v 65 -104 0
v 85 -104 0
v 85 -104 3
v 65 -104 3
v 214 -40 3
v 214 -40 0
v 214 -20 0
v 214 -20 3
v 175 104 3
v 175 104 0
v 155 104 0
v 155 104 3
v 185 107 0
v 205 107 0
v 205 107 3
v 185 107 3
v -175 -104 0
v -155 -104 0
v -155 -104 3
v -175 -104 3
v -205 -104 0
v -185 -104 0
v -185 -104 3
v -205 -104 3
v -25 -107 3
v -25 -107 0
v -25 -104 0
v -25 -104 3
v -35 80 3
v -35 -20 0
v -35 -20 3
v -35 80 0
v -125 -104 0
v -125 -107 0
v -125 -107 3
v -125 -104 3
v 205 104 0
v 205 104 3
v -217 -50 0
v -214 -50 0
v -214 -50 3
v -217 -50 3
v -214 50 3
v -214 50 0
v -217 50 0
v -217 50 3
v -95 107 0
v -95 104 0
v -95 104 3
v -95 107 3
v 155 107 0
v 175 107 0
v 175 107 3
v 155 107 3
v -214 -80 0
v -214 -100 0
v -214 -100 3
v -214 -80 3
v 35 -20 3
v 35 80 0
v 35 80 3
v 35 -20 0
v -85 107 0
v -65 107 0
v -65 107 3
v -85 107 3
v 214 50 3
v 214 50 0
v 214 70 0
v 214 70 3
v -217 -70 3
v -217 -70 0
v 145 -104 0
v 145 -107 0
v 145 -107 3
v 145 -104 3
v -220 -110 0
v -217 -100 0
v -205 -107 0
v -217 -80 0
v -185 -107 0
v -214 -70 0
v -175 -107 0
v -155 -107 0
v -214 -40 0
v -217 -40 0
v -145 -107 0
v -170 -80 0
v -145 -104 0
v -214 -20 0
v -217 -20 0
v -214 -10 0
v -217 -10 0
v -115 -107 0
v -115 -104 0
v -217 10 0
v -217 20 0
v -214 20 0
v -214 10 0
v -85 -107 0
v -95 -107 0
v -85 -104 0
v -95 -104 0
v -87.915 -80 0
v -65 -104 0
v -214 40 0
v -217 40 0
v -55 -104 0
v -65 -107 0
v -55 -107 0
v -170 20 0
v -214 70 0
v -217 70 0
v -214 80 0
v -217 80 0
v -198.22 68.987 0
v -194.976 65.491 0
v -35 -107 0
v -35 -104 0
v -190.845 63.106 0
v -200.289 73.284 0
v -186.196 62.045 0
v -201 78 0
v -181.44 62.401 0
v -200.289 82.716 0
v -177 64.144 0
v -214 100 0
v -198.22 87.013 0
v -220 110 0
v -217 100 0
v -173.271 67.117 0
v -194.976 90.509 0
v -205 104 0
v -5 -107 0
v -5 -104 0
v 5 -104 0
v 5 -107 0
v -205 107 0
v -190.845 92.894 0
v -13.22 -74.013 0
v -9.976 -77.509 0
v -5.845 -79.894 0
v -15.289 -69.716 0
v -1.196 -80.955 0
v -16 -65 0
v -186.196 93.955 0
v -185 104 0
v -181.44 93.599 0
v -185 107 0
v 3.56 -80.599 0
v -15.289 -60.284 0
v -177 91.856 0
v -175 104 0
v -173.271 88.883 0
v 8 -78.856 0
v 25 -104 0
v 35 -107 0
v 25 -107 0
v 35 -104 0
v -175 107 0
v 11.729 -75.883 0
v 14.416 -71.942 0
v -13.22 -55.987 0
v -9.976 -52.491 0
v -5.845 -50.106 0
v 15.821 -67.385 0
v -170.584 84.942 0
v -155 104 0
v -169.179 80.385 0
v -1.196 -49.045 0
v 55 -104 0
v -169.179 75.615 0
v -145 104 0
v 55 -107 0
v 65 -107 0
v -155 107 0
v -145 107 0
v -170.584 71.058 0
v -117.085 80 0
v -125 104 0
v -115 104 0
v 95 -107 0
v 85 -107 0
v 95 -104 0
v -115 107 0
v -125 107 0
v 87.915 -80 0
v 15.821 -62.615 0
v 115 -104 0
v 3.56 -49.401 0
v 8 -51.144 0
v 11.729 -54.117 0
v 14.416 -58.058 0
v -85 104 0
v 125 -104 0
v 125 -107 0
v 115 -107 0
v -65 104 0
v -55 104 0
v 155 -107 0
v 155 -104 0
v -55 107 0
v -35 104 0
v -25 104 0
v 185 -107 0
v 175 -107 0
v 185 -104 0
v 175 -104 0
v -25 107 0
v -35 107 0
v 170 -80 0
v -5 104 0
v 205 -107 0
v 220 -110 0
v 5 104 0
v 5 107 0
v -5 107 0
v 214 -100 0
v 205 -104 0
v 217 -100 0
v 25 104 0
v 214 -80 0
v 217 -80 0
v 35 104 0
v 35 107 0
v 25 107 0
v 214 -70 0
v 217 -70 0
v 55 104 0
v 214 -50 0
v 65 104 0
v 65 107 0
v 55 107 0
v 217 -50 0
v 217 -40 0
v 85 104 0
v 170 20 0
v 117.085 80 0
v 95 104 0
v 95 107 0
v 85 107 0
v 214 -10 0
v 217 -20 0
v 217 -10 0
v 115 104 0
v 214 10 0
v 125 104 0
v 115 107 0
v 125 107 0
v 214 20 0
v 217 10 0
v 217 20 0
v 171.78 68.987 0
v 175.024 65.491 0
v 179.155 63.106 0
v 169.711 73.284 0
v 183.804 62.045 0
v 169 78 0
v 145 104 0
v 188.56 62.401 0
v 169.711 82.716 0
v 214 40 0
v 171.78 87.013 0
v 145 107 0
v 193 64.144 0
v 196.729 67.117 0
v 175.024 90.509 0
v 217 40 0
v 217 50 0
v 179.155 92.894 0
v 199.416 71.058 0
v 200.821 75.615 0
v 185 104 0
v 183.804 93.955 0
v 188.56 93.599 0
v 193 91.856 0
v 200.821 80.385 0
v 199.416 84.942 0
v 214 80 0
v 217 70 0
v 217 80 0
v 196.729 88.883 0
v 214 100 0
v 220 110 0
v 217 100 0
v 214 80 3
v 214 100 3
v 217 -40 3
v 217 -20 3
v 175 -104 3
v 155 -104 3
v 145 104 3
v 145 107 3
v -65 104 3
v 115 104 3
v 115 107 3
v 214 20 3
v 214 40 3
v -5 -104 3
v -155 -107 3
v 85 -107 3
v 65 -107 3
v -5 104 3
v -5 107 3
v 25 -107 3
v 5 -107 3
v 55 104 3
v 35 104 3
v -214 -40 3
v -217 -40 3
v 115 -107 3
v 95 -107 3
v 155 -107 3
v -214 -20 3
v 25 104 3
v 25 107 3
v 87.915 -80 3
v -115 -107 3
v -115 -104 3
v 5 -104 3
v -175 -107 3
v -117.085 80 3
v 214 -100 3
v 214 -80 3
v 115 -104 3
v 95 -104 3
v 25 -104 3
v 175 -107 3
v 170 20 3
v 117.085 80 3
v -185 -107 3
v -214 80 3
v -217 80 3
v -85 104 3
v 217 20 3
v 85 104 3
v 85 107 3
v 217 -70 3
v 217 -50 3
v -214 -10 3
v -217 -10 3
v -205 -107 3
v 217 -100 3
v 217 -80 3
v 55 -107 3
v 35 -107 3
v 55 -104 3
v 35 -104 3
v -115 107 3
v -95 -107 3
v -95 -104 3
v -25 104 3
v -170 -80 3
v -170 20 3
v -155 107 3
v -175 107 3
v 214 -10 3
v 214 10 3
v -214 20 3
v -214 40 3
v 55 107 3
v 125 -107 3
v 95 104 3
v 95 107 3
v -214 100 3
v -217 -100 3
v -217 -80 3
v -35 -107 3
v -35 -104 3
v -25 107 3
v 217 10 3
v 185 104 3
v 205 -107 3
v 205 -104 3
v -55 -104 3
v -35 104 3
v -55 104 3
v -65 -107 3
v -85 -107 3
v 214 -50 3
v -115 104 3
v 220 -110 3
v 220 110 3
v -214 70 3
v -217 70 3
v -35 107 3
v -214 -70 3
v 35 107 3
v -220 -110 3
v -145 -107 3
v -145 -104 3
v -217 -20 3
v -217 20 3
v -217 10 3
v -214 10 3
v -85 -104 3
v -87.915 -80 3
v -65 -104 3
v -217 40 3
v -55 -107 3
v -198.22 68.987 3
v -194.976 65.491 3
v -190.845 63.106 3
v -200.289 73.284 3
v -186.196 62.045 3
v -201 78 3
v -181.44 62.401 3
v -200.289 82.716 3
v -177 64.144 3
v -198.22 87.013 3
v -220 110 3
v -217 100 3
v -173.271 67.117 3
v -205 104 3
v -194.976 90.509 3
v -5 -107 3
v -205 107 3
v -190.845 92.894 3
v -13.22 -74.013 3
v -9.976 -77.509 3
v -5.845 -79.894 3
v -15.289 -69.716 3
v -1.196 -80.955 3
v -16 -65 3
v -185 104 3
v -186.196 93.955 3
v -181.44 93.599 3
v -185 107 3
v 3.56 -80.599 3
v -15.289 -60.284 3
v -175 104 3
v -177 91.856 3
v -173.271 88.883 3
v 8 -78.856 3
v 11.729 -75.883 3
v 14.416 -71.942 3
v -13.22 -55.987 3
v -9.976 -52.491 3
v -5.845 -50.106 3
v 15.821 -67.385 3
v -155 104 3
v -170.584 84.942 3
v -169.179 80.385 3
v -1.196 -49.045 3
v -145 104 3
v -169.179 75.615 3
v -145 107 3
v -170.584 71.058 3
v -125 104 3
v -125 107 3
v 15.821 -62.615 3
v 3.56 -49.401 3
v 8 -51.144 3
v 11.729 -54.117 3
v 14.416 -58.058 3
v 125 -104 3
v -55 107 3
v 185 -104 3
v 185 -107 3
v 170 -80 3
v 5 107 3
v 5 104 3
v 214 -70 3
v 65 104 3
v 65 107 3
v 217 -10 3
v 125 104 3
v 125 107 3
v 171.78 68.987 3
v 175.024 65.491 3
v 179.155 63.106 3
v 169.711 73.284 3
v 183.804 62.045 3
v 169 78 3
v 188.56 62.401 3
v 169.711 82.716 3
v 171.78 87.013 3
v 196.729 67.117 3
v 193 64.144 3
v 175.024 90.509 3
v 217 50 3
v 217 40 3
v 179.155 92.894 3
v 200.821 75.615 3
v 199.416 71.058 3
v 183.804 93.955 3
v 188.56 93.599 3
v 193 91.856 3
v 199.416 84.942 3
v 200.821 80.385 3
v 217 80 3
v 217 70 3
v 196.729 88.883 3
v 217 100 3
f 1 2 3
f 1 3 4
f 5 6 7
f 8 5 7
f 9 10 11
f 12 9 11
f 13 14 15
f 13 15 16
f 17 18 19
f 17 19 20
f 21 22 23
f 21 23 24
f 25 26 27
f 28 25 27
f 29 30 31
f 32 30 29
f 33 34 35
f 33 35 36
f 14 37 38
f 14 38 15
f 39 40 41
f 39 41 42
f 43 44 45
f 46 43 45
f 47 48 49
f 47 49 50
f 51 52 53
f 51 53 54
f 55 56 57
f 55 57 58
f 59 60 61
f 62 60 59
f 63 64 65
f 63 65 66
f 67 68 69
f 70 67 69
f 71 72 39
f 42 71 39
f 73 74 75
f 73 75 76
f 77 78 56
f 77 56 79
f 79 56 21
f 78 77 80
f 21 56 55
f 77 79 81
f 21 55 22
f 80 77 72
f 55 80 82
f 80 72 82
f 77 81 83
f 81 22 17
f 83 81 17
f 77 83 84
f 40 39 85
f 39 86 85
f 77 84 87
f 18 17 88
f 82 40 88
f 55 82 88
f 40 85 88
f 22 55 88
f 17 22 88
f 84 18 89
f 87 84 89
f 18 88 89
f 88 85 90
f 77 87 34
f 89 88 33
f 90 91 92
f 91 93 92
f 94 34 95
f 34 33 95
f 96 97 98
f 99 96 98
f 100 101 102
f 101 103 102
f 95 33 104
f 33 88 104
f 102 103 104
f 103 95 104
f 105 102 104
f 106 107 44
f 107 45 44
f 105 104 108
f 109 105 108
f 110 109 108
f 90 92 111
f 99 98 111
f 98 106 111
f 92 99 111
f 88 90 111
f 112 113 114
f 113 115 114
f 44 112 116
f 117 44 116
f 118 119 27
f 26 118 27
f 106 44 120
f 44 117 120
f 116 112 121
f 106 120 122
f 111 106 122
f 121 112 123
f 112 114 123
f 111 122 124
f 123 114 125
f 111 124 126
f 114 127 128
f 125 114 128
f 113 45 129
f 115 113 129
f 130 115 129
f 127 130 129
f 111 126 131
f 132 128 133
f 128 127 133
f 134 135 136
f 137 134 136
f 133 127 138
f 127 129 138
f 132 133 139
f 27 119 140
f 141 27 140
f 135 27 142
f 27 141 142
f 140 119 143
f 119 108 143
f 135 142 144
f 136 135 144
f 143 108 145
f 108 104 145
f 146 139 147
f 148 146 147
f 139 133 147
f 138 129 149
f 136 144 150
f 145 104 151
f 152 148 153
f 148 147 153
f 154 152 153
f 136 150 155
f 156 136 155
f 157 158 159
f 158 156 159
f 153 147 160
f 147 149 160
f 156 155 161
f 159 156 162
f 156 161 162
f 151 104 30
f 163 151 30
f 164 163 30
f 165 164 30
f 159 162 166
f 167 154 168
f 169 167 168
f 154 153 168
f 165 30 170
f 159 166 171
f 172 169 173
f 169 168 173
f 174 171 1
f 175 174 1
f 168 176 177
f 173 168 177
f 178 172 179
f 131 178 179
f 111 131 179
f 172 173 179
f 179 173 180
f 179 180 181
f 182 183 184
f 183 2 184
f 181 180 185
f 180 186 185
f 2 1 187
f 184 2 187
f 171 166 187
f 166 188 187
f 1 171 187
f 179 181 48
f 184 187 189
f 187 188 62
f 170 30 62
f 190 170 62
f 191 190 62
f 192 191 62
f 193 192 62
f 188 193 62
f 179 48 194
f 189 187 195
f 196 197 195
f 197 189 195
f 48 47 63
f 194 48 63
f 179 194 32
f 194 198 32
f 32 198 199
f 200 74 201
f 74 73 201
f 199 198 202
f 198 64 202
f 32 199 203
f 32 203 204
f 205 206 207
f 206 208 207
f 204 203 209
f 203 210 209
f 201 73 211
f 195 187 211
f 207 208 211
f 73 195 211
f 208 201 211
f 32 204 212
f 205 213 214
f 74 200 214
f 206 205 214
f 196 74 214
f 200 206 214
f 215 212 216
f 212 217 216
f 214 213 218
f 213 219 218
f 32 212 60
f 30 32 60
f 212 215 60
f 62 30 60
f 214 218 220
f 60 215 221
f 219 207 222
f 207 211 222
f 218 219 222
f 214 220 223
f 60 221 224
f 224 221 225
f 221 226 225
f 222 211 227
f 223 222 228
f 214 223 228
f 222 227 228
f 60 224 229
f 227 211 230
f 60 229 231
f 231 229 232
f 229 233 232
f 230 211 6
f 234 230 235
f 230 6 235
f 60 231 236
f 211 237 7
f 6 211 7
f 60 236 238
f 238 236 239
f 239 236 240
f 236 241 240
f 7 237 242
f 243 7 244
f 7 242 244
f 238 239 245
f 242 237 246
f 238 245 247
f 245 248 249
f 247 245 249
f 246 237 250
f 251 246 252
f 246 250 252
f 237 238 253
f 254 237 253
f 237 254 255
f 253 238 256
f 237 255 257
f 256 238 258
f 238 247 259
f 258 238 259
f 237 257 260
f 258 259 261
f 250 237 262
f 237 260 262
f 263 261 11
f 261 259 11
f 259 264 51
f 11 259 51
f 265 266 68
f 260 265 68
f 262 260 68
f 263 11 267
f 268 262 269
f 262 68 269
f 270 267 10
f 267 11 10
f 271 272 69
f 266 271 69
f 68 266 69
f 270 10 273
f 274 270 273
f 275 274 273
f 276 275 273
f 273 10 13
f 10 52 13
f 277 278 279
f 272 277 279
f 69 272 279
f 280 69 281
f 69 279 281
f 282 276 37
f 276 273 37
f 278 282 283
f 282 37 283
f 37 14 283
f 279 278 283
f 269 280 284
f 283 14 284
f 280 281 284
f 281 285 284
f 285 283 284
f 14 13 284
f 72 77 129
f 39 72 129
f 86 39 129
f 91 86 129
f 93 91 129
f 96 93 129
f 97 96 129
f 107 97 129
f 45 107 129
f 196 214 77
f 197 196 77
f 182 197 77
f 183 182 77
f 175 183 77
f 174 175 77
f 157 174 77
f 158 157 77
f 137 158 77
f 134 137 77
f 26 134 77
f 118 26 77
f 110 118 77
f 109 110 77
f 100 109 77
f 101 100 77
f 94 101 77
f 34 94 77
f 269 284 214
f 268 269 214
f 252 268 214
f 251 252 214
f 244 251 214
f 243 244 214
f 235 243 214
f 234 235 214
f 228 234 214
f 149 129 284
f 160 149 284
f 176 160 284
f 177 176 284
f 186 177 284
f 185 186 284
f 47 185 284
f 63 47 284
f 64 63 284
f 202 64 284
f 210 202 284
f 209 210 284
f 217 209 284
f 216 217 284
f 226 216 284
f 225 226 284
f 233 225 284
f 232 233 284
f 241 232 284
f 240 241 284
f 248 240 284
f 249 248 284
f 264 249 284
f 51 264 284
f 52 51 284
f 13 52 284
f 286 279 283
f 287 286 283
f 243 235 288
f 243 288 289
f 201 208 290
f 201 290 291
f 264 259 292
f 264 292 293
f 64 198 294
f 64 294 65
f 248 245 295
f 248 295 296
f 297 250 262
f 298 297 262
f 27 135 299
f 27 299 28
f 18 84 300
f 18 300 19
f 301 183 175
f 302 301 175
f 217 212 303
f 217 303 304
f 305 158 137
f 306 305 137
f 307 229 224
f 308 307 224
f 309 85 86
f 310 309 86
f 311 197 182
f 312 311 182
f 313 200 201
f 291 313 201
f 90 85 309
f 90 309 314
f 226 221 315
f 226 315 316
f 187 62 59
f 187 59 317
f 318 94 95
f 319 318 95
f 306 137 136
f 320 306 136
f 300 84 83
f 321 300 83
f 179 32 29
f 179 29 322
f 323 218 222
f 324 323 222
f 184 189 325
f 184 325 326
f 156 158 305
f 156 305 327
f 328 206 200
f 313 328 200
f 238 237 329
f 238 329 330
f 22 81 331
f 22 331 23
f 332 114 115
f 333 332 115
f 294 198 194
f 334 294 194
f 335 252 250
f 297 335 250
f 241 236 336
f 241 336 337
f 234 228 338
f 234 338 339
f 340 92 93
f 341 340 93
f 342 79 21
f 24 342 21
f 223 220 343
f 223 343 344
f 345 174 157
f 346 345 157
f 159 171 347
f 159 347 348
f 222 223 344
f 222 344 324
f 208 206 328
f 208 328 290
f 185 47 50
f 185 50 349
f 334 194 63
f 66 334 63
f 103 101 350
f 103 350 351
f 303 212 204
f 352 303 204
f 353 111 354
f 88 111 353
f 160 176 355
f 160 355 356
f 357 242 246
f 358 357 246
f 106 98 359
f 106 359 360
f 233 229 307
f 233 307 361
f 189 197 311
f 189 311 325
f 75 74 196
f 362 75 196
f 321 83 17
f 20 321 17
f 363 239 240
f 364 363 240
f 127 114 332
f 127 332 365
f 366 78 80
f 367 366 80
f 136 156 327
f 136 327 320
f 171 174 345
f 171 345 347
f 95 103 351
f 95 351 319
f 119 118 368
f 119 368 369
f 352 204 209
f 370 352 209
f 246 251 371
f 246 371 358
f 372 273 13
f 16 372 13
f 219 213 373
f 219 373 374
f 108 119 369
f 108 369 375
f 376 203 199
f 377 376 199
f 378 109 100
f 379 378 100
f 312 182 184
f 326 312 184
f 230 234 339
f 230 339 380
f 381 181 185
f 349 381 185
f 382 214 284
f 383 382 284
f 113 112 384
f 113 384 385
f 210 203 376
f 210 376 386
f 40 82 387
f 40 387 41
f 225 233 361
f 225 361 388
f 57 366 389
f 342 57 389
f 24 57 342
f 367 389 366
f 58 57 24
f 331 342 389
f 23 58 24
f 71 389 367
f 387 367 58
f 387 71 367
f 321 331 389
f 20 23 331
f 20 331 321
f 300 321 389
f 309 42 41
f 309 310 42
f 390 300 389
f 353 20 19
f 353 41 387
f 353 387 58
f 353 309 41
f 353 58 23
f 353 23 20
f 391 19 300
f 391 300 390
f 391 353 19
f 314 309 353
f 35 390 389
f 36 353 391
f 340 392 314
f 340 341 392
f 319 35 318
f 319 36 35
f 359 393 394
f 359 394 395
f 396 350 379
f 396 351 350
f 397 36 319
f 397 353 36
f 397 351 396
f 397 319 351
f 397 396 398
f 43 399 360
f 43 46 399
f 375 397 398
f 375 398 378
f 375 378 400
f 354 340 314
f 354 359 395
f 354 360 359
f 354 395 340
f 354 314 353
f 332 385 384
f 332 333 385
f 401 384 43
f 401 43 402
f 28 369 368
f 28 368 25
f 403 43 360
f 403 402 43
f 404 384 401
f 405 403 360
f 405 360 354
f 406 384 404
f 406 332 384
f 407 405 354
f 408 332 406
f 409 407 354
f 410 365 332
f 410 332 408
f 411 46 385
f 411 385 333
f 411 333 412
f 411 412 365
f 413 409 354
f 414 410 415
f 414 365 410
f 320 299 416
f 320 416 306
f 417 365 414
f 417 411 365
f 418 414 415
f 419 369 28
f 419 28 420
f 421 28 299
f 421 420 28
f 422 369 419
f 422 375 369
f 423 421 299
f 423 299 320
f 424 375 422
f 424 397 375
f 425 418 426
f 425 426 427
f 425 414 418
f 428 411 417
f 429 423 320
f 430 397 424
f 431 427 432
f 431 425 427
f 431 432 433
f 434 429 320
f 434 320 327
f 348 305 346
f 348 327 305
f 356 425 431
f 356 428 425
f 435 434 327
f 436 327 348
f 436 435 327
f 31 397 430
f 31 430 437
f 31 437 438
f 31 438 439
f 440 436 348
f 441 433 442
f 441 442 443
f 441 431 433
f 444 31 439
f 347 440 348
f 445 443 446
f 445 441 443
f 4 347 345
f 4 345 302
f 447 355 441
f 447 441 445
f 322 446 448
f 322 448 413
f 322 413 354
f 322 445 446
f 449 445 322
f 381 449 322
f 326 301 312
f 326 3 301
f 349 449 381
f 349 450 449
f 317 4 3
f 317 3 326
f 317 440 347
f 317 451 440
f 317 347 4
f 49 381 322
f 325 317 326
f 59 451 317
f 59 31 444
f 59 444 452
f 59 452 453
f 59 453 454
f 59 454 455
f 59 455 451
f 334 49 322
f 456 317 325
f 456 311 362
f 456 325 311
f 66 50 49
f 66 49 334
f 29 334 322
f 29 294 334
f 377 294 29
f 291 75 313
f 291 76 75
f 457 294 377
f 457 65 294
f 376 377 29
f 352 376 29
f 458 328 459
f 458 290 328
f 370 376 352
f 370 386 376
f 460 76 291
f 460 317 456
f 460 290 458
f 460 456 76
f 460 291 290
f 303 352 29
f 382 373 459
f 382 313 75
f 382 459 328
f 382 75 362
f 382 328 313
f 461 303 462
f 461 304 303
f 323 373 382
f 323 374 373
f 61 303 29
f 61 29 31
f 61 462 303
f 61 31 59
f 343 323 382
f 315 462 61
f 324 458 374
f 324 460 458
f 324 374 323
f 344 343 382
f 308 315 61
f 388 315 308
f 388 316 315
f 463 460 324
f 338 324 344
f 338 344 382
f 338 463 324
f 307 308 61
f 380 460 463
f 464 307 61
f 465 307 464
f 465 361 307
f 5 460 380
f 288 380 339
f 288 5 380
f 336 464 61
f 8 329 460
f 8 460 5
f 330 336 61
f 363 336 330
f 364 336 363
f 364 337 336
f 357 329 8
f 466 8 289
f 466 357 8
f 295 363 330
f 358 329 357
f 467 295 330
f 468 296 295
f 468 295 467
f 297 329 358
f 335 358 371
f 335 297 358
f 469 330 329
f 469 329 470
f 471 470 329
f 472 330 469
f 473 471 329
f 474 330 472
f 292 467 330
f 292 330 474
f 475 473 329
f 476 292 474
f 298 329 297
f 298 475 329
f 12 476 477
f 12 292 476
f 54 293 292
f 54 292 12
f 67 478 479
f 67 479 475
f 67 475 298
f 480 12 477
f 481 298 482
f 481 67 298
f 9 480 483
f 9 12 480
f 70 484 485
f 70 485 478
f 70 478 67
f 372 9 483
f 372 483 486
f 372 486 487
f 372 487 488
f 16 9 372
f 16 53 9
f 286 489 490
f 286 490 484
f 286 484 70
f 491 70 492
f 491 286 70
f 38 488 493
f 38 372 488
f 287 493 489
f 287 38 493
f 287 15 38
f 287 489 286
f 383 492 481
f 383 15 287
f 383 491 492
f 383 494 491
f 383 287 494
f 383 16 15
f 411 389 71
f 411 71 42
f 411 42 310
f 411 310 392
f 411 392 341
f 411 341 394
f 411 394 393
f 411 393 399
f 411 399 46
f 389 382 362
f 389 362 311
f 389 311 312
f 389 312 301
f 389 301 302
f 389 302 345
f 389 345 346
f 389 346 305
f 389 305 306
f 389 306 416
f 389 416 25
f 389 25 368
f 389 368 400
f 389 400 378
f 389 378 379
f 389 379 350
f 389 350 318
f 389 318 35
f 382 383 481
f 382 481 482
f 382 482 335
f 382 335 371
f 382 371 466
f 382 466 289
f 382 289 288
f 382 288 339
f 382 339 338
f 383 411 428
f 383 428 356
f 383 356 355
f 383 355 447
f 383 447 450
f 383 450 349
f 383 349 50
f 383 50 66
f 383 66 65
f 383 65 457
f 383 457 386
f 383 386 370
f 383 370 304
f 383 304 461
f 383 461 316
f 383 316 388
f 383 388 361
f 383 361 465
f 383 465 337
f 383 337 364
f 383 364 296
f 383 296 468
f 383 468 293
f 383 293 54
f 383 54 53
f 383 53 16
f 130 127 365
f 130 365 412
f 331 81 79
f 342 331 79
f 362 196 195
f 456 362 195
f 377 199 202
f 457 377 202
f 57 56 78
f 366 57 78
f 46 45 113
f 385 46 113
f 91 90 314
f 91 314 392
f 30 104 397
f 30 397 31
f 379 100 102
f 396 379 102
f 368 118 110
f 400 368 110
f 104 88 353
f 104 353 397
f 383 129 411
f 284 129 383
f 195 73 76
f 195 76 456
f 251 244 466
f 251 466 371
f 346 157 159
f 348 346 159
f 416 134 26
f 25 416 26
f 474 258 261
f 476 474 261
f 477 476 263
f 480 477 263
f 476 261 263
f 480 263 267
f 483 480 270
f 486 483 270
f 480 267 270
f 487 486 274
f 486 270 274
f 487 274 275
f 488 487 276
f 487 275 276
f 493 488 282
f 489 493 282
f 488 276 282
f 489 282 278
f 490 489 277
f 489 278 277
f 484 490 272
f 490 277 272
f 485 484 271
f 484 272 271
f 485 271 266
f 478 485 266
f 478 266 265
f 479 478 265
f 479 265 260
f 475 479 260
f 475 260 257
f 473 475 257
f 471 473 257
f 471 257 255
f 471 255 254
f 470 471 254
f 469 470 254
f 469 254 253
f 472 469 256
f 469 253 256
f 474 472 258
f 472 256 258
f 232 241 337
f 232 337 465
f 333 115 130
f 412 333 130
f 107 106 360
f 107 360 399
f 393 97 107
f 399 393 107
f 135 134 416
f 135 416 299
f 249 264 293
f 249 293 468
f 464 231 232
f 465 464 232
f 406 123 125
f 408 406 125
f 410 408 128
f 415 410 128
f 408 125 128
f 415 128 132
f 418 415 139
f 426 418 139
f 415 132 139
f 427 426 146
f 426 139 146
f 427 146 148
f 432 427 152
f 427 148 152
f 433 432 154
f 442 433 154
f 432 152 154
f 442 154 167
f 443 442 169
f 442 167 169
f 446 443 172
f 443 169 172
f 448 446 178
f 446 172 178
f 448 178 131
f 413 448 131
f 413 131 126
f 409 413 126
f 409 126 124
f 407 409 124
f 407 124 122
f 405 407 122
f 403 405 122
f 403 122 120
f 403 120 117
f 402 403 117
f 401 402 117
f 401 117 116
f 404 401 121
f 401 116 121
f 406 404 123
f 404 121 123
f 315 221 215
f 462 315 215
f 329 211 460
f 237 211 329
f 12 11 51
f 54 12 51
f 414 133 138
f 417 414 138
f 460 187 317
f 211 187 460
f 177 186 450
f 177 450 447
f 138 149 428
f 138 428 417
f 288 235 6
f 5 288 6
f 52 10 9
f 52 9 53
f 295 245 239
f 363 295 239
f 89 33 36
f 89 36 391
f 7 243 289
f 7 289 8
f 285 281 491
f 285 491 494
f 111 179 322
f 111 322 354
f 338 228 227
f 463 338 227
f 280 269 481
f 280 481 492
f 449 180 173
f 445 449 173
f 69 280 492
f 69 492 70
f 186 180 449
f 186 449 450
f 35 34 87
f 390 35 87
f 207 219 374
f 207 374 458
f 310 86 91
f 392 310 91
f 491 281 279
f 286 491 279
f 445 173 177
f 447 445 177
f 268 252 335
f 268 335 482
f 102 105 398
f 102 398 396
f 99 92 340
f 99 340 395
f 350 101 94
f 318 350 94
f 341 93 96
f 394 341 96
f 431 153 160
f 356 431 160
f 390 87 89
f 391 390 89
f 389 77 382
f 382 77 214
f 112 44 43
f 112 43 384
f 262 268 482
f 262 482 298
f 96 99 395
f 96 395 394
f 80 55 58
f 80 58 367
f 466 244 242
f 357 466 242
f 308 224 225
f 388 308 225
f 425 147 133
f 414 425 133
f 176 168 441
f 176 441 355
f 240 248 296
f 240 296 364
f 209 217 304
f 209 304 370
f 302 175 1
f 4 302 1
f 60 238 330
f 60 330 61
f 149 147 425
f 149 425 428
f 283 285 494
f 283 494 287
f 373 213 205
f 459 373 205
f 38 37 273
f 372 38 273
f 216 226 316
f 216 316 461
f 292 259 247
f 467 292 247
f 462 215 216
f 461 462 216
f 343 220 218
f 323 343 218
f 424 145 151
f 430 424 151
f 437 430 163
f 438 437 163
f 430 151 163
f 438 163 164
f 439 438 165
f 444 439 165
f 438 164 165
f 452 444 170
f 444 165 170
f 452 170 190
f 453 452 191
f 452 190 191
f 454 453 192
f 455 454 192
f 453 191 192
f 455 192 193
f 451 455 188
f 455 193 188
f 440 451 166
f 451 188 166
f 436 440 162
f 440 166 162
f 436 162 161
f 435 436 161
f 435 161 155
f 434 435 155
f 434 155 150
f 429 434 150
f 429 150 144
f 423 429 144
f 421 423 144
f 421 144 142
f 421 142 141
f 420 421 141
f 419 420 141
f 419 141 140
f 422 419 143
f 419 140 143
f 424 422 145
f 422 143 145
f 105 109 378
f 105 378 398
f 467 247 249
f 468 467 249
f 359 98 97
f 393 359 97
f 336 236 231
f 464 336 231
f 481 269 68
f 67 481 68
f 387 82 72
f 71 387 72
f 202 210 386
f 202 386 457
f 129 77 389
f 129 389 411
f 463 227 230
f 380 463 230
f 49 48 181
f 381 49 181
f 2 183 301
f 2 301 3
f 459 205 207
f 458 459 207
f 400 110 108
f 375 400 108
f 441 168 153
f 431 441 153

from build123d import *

# Parameters (mm, degrees)
ESQUISSE1_W                      = 440
ESQUISSE1_H                      = 220
BOSS_EXTRU_1_DEPTH               = 3
ESQUISSE2_R                      = 16
ENL_V_MAT_TUBE_DEPTH             = 3
ESQUISSE4_W                      = 20
ESQUISSE4_H                      = 3
ENL_V_MAT_C_T_ARRI_REBOITE_DEPTH = 3
ESQUISSE5_W                      = 3
ESQUISSE5_H                      = 20
ENL_V_MAT_C_T_DGBOITE_DEPTH      = 3
ENL_V_MAT_EXTRU_1_DEPTH          = 3


with BuildPart() as part:
    # Esquisse1 → Boss.-Extru.1 (new body)
    with BuildSketch(Plane.XY):
        Rectangle(ESQUISSE1_W, ESQUISSE1_H)
    extrude(amount=BOSS_EXTRU_1_DEPTH)

    # Esquisse2 → Enlèv. mat._Tube (cut)
    with BuildSketch(Plane(origin=(0, 0, 0), x_dir=(-1, 0, 0), z_dir=(0, 0, -1))):
        with Locations((-185, 78)):
            Circle(ESQUISSE2_R)
        with Locations((185, 78)):
            Circle(ESQUISSE2_R)
        with Locations((0, -65)):
            Circle(ESQUISSE2_R)
    extrude(amount=-ENL_V_MAT_TUBE_DEPTH, mode=Mode.SUBTRACT)

    # Esquisse4 → Enlèv. mat._CôtéArrièreBoite (cut)
    with BuildSketch(Plane(origin=(0, 0, 0), x_dir=(-1, 0, 0), z_dir=(0, 0, -1))):
        with Locations((-195, 105.5)):
            Rectangle(ESQUISSE4_W, ESQUISSE4_H)
        with Locations((-165, 105.5)):
            Rectangle(ESQUISSE4_W, ESQUISSE4_H)
        with Locations((-135, 105.5)):
            Rectangle(ESQUISSE4_W, ESQUISSE4_H)
        with Locations((-105, 105.5)):
            Rectangle(ESQUISSE4_W, ESQUISSE4_H)
        with Locations((-75, 105.5)):
            Rectangle(ESQUISSE4_W, ESQUISSE4_H)
        with Locations((-45, 105.5)):
            Rectangle(ESQUISSE4_W, ESQUISSE4_H)
        with Locations((-15, 105.5)):
            Rectangle(ESQUISSE4_W, ESQUISSE4_H)
        with Locations((15, 105.5)):
            Rectangle(ESQUISSE4_W, ESQUISSE4_H)
        with Locations((45, 105.5)):
            Rectangle(ESQUISSE4_W, ESQUISSE4_H)
        with Locations((75, 105.5)):
            Rectangle(ESQUISSE4_W, ESQUISSE4_H)
        with Locations((105, 105.5)):
            Rectangle(ESQUISSE4_W, ESQUISSE4_H)
        with Locations((135, 105.5)):
            Rectangle(ESQUISSE4_W, ESQUISSE4_H)
        with Locations((165, 105.5)):
            Rectangle(ESQUISSE4_W, ESQUISSE4_H)
        with Locations((195, 105.5)):
            Rectangle(ESQUISSE4_W, ESQUISSE4_H)
        with Locations((105, -105.5)):
            Rectangle(ESQUISSE4_W, ESQUISSE4_H)
        with Locations((135, -105.5)):
            Rectangle(ESQUISSE4_W, ESQUISSE4_H)
        with Locations((165, -105.5)):
            Rectangle(ESQUISSE4_W, ESQUISSE4_H)
        with Locations((195, -105.5)):
            Rectangle(ESQUISSE4_W, ESQUISSE4_H)
        with Locations((75, -105.5)):
            Rectangle(ESQUISSE4_W, ESQUISSE4_H)
        with Locations((45, -105.5)):
            Rectangle(ESQUISSE4_W, ESQUISSE4_H)
        with Locations((15, -105.5)):
            Rectangle(ESQUISSE4_W, ESQUISSE4_H)
        with Locations((-15, -105.5)):
            Rectangle(ESQUISSE4_W, ESQUISSE4_H)
        with Locations((-45, -105.5)):
            Rectangle(ESQUISSE4_W, ESQUISSE4_H)
        with Locations((-75, -105.5)):
            Rectangle(ESQUISSE4_W, ESQUISSE4_H)
        with Locations((-105, -105.5)):
            Rectangle(ESQUISSE4_W, ESQUISSE4_H)
        with Locations((-135, -105.5)):
            Rectangle(ESQUISSE4_W, ESQUISSE4_H)
        with Locations((-165, -105.5)):
            Rectangle(ESQUISSE4_W, ESQUISSE4_H)
        with Locations((-195, -105.5)):
            Rectangle(ESQUISSE4_W, ESQUISSE4_H)
    extrude(amount=-ENL_V_MAT_C_T_ARRI_REBOITE_DEPTH, mode=Mode.SUBTRACT)

    # Esquisse5 → Enlèv. mat.-CôtéDGBoite (cut)
    with BuildSketch(Plane(origin=(0, 0, 0), x_dir=(-1, 0, 0), z_dir=(0, 0, -1))):
        with Locations((-215.5, -90)):
            Rectangle(ESQUISSE5_W, ESQUISSE5_H)
        with Locations((-215.5, -60)):
            Rectangle(ESQUISSE5_W, ESQUISSE5_H)
        with Locations((-215.5, -30)):
            Rectangle(ESQUISSE5_W, ESQUISSE5_H)
        with Locations((-215.5, 0)):
            Rectangle(ESQUISSE5_W, ESQUISSE5_H)
        with Locations((-215.5, 30)):
            Rectangle(ESQUISSE5_W, ESQUISSE5_H)
        with Locations((-215.5, 60)):
            Rectangle(ESQUISSE5_W, ESQUISSE5_H)
        with Locations((-215.5, 90)):
            Rectangle(ESQUISSE5_W, ESQUISSE5_H)
        with Locations((215.5, 90)):
            Rectangle(ESQUISSE5_W, ESQUISSE5_H)
        with Locations((215.5, 60)):
            Rectangle(ESQUISSE5_W, ESQUISSE5_H)
        with Locations((215.5, 30)):
            Rectangle(ESQUISSE5_W, ESQUISSE5_H)
        with Locations((215.5, 0)):
            Rectangle(ESQUISSE5_W, ESQUISSE5_H)
        with Locations((215.5, -30)):
            Rectangle(ESQUISSE5_W, ESQUISSE5_H)
        with Locations((215.5, -60)):
            Rectangle(ESQUISSE5_W, ESQUISSE5_H)
        with Locations((215.5, -90)):
            Rectangle(ESQUISSE5_W, ESQUISSE5_H)
    extrude(amount=-ENL_V_MAT_C_T_DGBOITE_DEPTH, mode=Mode.SUBTRACT)

    # Esquisse6 → Enlèv. mat.-Extru.1 (cut)
    with BuildSketch(Plane(origin=(0, 0, 0), x_dir=(-1, 0, 0), z_dir=(0, 0, -1))):
        Polygon((-170, 20), (-117.084973779, 80), (-35, 80), (-35, -20), (-87.915026221, -80), (-170, -80), align=None)
        Polygon((170, 20), (170, -80), (87.915026221, -80), (35, -20), (35, 80), (117.084973779, 80), align=None)
    extrude(amount=-ENL_V_MAT_EXTRU_1_DEPTH, mode=Mode.SUBTRACT)


solid = part.part
